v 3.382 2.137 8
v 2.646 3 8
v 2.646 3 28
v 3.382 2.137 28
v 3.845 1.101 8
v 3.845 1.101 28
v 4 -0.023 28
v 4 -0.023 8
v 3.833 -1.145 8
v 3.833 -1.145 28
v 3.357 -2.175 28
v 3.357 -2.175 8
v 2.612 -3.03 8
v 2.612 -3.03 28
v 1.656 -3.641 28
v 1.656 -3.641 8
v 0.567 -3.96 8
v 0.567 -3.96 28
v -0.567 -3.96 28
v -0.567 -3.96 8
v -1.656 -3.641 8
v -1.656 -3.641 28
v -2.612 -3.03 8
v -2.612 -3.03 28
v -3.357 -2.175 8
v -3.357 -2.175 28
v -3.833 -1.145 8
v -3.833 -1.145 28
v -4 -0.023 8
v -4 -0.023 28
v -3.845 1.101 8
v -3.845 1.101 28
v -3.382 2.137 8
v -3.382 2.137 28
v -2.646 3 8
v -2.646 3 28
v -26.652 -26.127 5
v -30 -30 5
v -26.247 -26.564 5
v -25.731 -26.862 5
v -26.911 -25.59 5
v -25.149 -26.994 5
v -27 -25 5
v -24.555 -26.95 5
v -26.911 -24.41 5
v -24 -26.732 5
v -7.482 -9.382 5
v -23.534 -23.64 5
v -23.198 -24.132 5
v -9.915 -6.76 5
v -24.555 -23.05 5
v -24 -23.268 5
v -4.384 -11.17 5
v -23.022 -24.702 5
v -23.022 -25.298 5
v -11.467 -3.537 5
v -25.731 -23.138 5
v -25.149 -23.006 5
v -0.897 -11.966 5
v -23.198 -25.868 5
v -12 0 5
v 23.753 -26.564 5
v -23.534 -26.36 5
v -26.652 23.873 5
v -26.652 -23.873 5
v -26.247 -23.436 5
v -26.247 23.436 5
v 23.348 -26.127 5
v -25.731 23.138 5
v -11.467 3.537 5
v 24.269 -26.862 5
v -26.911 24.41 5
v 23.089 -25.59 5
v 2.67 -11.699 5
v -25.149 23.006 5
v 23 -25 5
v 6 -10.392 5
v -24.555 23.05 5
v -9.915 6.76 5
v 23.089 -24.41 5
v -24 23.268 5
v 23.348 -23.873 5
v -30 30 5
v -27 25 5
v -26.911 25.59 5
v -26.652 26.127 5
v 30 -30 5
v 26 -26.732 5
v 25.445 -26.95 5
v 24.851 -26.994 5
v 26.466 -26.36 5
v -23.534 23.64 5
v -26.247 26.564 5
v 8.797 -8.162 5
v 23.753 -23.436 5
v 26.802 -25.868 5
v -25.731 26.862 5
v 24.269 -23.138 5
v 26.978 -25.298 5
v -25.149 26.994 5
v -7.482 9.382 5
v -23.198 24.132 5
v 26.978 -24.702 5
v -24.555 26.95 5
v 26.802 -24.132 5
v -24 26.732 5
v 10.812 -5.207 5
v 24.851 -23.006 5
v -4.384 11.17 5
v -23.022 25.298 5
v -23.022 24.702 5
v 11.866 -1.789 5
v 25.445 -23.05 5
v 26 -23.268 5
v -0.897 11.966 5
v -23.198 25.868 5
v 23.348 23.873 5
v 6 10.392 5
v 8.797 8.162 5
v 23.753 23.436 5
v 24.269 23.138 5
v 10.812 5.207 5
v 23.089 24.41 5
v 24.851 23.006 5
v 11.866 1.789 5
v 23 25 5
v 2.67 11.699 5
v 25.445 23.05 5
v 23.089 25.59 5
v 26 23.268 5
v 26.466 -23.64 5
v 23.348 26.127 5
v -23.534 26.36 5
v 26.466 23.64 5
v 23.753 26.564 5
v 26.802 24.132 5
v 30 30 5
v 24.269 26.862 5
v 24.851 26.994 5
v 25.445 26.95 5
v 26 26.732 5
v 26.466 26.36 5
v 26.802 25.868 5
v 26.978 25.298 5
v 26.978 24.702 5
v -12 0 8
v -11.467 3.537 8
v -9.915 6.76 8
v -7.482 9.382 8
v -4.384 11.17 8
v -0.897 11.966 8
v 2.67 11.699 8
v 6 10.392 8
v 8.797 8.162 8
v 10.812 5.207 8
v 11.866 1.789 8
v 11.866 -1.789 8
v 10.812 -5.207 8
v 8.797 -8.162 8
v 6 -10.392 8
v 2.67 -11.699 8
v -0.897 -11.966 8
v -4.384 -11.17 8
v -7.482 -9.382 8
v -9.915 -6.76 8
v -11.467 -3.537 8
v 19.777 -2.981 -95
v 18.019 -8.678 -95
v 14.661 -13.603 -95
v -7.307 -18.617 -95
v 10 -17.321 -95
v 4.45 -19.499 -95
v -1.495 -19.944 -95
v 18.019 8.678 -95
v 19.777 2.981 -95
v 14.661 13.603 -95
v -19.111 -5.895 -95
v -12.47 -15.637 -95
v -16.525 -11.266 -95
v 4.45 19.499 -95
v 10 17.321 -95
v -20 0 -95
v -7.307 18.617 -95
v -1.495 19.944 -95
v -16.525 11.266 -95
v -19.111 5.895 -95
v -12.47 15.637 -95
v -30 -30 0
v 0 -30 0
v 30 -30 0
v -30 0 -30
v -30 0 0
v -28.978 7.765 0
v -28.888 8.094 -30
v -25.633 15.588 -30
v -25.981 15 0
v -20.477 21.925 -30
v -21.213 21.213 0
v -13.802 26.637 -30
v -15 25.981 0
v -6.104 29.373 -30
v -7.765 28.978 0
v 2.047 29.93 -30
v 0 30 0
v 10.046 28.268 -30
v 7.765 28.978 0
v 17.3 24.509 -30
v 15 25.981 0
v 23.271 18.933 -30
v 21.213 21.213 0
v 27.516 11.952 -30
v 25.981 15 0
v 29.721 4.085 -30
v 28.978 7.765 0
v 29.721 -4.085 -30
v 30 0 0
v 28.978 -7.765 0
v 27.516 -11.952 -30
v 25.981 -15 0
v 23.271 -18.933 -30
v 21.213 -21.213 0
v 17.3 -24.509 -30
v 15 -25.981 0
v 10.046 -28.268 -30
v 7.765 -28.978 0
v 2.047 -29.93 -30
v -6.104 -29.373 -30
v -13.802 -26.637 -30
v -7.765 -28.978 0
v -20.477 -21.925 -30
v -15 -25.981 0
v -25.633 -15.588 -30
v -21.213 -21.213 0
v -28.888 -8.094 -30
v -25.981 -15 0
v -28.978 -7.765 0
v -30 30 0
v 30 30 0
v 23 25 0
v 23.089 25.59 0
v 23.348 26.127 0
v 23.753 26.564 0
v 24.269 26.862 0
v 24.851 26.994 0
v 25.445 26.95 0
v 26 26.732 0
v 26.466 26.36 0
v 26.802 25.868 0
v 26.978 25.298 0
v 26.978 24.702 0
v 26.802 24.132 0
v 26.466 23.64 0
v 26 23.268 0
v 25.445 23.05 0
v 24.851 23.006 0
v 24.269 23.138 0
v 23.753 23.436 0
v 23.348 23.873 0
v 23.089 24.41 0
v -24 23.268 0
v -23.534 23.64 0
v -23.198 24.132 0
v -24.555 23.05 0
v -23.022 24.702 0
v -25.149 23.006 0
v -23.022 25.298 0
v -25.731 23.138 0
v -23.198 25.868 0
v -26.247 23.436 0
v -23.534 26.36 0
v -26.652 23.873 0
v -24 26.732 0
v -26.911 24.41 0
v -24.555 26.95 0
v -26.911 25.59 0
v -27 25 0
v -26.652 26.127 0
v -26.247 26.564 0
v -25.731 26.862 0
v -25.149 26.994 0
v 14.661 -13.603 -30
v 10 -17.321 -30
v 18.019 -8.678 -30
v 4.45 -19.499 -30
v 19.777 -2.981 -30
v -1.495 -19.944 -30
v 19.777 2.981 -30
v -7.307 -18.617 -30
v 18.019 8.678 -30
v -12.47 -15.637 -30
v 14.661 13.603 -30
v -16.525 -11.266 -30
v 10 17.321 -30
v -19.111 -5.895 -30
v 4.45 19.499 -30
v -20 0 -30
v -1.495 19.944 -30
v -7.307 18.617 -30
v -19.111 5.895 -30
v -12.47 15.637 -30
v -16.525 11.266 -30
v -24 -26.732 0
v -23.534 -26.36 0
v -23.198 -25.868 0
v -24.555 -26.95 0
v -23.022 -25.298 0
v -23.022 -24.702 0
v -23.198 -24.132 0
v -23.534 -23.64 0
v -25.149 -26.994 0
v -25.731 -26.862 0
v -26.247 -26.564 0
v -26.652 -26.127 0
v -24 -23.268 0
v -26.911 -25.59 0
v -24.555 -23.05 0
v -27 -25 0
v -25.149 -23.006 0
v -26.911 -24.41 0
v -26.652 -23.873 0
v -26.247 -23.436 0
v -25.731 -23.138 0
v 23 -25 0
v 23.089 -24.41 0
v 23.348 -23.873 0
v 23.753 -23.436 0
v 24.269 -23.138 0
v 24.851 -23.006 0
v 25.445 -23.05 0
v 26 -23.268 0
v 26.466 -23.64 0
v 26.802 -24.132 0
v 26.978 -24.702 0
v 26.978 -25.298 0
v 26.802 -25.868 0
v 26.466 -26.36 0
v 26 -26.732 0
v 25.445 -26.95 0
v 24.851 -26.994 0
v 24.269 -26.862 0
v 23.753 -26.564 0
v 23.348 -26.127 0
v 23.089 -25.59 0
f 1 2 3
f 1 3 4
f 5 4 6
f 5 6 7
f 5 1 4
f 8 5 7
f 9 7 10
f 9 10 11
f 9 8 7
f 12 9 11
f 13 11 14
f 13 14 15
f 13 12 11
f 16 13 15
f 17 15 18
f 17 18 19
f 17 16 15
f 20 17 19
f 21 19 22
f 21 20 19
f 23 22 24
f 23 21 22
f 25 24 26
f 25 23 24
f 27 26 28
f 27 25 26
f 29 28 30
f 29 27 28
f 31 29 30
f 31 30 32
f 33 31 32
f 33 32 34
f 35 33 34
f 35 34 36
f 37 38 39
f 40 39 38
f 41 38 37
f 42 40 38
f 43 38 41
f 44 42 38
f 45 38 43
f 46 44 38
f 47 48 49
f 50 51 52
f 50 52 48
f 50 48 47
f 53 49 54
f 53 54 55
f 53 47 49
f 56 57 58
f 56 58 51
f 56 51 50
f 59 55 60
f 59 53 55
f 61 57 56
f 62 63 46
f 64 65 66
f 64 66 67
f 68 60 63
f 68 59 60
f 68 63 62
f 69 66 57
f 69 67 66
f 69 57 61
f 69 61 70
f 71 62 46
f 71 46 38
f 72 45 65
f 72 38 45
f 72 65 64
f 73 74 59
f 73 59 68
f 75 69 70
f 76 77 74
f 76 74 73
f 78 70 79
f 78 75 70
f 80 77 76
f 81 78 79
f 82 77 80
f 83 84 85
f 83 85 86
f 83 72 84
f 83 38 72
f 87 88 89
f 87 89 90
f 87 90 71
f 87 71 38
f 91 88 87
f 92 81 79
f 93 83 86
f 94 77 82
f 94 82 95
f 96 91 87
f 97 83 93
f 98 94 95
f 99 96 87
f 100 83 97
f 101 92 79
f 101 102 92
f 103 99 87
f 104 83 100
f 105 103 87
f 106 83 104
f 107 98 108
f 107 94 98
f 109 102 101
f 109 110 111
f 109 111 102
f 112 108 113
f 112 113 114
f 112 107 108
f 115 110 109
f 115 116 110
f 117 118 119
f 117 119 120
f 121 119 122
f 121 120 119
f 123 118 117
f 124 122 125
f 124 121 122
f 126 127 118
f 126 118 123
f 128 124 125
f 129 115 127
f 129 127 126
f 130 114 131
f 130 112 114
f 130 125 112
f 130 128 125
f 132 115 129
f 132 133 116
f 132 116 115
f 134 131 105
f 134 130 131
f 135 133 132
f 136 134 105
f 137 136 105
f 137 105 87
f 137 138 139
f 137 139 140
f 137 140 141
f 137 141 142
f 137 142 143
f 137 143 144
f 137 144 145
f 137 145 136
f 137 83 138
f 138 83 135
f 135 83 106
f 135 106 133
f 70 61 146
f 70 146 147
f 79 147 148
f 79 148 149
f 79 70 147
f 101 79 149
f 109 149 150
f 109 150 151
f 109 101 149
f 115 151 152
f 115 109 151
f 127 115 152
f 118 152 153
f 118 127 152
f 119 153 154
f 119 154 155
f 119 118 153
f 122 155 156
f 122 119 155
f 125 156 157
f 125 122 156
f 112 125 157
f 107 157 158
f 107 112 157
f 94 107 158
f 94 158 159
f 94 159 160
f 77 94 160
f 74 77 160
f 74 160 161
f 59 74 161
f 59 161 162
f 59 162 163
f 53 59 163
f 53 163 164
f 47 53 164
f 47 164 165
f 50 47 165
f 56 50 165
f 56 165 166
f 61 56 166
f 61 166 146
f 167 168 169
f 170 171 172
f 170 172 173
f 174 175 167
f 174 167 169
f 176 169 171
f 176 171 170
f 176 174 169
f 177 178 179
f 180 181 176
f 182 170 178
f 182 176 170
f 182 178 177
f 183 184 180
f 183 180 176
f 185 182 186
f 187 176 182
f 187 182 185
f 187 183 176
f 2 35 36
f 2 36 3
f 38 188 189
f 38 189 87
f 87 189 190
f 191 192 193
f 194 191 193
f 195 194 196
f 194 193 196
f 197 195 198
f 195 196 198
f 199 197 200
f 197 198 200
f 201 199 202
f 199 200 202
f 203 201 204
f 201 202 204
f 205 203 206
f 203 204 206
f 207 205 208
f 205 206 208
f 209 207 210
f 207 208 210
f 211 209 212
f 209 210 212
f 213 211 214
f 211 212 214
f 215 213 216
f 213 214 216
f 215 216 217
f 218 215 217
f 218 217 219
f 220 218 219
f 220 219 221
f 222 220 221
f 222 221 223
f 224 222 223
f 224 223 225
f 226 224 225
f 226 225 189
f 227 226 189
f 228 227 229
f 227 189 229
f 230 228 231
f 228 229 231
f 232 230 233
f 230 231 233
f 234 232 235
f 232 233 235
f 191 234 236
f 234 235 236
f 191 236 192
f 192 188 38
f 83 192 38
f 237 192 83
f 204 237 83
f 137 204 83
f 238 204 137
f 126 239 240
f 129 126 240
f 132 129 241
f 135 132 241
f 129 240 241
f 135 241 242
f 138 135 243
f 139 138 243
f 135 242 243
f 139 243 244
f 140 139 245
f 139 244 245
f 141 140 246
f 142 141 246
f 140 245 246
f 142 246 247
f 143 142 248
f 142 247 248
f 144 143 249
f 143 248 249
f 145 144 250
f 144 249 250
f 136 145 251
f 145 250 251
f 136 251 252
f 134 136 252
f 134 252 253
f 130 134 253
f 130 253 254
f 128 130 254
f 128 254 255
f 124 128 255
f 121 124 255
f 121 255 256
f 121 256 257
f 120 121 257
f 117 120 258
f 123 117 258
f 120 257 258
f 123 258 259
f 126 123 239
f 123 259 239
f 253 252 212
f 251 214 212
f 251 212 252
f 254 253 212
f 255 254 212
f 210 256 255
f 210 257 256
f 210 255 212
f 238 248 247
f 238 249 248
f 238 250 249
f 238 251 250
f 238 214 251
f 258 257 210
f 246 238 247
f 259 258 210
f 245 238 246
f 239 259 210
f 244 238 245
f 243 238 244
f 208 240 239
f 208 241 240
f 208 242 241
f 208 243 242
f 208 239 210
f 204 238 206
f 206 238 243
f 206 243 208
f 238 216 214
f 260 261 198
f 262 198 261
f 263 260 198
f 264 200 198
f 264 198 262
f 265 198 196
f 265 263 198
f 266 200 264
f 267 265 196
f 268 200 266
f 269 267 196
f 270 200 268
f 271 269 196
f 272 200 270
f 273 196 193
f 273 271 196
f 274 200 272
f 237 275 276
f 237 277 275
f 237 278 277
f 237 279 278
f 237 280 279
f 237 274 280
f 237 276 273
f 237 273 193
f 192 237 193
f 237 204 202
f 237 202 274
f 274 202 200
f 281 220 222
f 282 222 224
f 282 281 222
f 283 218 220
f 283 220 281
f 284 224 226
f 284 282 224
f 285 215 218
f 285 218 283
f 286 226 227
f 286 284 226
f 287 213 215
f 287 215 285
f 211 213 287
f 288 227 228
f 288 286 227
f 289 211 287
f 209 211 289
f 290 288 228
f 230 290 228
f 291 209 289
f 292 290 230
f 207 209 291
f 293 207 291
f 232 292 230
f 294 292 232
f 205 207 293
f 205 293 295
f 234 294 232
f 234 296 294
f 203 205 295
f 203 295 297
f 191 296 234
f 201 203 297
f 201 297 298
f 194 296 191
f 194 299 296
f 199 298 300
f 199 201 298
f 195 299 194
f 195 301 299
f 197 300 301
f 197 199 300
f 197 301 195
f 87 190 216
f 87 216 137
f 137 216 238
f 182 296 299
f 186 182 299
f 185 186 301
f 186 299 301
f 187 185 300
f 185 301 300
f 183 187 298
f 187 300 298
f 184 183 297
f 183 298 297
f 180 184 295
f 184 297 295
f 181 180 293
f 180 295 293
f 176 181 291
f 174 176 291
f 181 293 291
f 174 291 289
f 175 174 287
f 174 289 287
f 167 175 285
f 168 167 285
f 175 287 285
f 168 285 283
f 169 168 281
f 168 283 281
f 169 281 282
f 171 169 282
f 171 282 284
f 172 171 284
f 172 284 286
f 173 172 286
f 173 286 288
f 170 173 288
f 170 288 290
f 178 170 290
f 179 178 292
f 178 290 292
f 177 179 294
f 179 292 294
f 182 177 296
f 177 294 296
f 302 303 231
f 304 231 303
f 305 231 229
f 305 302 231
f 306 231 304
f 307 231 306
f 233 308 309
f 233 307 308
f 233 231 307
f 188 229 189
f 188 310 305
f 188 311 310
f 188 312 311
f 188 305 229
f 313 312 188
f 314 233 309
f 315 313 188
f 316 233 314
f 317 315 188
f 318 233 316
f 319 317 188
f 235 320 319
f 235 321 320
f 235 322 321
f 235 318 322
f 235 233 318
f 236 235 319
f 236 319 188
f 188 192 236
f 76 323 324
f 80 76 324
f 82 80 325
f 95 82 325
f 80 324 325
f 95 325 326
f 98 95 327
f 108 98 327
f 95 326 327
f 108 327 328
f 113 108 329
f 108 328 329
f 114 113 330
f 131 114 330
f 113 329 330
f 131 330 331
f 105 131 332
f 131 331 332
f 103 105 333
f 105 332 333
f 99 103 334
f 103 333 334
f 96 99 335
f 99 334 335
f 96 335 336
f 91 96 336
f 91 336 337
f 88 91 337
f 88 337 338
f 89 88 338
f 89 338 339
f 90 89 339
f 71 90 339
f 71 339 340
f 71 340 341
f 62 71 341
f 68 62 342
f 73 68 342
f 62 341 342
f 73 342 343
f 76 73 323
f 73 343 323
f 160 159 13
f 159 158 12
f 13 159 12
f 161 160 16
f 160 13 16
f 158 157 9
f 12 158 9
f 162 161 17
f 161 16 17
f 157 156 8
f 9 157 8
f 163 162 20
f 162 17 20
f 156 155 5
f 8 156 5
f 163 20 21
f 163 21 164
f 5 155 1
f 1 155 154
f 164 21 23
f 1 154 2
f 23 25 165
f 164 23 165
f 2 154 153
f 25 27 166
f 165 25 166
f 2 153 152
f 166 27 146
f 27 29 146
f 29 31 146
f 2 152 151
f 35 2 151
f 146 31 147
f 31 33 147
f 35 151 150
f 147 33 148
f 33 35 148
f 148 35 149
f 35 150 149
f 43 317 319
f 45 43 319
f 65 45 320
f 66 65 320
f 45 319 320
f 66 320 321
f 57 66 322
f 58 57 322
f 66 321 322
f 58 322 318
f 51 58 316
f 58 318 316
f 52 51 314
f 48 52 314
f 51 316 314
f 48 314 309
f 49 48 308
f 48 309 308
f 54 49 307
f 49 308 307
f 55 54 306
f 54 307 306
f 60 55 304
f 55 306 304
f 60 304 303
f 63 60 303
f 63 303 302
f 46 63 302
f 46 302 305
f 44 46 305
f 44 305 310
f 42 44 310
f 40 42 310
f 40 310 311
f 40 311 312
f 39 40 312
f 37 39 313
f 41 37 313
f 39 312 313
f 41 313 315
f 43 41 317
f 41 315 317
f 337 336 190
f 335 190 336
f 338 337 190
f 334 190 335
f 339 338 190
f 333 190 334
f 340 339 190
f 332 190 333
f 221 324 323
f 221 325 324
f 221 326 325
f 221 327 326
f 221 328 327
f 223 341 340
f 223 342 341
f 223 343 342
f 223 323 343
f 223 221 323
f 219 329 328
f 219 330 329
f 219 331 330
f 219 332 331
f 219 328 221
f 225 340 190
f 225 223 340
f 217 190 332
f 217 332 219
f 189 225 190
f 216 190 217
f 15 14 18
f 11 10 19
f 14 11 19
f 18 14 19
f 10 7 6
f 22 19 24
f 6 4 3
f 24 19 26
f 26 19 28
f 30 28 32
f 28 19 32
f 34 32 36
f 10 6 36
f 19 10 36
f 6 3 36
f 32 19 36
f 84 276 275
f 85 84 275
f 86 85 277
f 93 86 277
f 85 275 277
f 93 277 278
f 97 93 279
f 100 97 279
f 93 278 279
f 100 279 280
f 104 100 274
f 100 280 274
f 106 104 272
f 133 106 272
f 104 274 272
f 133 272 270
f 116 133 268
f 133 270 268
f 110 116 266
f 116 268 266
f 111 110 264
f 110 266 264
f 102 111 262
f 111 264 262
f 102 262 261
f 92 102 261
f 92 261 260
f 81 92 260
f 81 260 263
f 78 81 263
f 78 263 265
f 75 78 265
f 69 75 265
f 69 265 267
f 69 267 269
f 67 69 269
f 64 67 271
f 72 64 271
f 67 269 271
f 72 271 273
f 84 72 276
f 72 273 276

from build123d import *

# Parameters (mm, degrees)
SKETCH1_W           = 60
SKETCH1_H           = 60
BOSS_EXTRUDE1_DEPTH = 5
SKETCH2_R           = 2
HOLE_DEPTH          = 5
SKETCH3_R           = 12
BOSS_EXTRUDE2_DEPTH = 8
SHAFT_DEPTH         = 20
SKETCH5_R           = 30
GEAR_DEPTH          = 30
SKETCH6_R           = 20
MOTOR_DEPTH         = 65


with BuildPart() as part:
    # Sketch1 → Boss-Extrude1 (new body)
    with BuildSketch(Plane.XY):
        Rectangle(SKETCH1_W, SKETCH1_H)
    extrude(amount=BOSS_EXTRUDE1_DEPTH)

    # Sketch2 → hole (cut)
    with BuildSketch(Plane(origin=(0, 0, 0), x_dir=(-1, 0, 0), z_dir=(0, 0, -1))):
        with Locations((-25, 25)):
            Circle(SKETCH2_R)
        with Locations((25, 25)):
            Circle(SKETCH2_R)
        with Locations((25, -25)):
            Circle(SKETCH2_R)
        with Locations((-25, -25)):
            Circle(SKETCH2_R)
    extrude(amount=-HOLE_DEPTH, mode=Mode.SUBTRACT)

    # Sketch3 → Boss-Extrude2 (add)
    with BuildSketch(Plane(origin=(0, 0, 0), x_dir=(-1, 0, 0), z_dir=(0, 0, -1))):
        Circle(SKETCH3_R)
    extrude(amount=-BOSS_EXTRUDE2_DEPTH)

    # Sketch4 → shaft (add)
    with BuildSketch(Plane.XY.offset(8)):
        with BuildLine():
            Line((-2.645751311, 3), (2.645751311, 3))
            ThreePointArc((2.645751311, 3), (0, -4), (-2.645751311, 3))
        make_face()
    extrude(amount=SHAFT_DEPTH)

    # Sketch5 → gear (add)
    with BuildSketch(Plane(origin=(0, 0, 0), x_dir=(-1, 0, 0), z_dir=(0, 0, -1))):
        Circle(SKETCH5_R)
    extrude(amount=GEAR_DEPTH)

    # Sketch6 → motor (add)
    with BuildSketch(Plane(origin=(0, 0, -30), x_dir=(-1, 0, 0), z_dir=(0, 0, -1))):
        Circle(SKETCH6_R)
    extrude(amount=MOTOR_DEPTH)


solid = part.part
